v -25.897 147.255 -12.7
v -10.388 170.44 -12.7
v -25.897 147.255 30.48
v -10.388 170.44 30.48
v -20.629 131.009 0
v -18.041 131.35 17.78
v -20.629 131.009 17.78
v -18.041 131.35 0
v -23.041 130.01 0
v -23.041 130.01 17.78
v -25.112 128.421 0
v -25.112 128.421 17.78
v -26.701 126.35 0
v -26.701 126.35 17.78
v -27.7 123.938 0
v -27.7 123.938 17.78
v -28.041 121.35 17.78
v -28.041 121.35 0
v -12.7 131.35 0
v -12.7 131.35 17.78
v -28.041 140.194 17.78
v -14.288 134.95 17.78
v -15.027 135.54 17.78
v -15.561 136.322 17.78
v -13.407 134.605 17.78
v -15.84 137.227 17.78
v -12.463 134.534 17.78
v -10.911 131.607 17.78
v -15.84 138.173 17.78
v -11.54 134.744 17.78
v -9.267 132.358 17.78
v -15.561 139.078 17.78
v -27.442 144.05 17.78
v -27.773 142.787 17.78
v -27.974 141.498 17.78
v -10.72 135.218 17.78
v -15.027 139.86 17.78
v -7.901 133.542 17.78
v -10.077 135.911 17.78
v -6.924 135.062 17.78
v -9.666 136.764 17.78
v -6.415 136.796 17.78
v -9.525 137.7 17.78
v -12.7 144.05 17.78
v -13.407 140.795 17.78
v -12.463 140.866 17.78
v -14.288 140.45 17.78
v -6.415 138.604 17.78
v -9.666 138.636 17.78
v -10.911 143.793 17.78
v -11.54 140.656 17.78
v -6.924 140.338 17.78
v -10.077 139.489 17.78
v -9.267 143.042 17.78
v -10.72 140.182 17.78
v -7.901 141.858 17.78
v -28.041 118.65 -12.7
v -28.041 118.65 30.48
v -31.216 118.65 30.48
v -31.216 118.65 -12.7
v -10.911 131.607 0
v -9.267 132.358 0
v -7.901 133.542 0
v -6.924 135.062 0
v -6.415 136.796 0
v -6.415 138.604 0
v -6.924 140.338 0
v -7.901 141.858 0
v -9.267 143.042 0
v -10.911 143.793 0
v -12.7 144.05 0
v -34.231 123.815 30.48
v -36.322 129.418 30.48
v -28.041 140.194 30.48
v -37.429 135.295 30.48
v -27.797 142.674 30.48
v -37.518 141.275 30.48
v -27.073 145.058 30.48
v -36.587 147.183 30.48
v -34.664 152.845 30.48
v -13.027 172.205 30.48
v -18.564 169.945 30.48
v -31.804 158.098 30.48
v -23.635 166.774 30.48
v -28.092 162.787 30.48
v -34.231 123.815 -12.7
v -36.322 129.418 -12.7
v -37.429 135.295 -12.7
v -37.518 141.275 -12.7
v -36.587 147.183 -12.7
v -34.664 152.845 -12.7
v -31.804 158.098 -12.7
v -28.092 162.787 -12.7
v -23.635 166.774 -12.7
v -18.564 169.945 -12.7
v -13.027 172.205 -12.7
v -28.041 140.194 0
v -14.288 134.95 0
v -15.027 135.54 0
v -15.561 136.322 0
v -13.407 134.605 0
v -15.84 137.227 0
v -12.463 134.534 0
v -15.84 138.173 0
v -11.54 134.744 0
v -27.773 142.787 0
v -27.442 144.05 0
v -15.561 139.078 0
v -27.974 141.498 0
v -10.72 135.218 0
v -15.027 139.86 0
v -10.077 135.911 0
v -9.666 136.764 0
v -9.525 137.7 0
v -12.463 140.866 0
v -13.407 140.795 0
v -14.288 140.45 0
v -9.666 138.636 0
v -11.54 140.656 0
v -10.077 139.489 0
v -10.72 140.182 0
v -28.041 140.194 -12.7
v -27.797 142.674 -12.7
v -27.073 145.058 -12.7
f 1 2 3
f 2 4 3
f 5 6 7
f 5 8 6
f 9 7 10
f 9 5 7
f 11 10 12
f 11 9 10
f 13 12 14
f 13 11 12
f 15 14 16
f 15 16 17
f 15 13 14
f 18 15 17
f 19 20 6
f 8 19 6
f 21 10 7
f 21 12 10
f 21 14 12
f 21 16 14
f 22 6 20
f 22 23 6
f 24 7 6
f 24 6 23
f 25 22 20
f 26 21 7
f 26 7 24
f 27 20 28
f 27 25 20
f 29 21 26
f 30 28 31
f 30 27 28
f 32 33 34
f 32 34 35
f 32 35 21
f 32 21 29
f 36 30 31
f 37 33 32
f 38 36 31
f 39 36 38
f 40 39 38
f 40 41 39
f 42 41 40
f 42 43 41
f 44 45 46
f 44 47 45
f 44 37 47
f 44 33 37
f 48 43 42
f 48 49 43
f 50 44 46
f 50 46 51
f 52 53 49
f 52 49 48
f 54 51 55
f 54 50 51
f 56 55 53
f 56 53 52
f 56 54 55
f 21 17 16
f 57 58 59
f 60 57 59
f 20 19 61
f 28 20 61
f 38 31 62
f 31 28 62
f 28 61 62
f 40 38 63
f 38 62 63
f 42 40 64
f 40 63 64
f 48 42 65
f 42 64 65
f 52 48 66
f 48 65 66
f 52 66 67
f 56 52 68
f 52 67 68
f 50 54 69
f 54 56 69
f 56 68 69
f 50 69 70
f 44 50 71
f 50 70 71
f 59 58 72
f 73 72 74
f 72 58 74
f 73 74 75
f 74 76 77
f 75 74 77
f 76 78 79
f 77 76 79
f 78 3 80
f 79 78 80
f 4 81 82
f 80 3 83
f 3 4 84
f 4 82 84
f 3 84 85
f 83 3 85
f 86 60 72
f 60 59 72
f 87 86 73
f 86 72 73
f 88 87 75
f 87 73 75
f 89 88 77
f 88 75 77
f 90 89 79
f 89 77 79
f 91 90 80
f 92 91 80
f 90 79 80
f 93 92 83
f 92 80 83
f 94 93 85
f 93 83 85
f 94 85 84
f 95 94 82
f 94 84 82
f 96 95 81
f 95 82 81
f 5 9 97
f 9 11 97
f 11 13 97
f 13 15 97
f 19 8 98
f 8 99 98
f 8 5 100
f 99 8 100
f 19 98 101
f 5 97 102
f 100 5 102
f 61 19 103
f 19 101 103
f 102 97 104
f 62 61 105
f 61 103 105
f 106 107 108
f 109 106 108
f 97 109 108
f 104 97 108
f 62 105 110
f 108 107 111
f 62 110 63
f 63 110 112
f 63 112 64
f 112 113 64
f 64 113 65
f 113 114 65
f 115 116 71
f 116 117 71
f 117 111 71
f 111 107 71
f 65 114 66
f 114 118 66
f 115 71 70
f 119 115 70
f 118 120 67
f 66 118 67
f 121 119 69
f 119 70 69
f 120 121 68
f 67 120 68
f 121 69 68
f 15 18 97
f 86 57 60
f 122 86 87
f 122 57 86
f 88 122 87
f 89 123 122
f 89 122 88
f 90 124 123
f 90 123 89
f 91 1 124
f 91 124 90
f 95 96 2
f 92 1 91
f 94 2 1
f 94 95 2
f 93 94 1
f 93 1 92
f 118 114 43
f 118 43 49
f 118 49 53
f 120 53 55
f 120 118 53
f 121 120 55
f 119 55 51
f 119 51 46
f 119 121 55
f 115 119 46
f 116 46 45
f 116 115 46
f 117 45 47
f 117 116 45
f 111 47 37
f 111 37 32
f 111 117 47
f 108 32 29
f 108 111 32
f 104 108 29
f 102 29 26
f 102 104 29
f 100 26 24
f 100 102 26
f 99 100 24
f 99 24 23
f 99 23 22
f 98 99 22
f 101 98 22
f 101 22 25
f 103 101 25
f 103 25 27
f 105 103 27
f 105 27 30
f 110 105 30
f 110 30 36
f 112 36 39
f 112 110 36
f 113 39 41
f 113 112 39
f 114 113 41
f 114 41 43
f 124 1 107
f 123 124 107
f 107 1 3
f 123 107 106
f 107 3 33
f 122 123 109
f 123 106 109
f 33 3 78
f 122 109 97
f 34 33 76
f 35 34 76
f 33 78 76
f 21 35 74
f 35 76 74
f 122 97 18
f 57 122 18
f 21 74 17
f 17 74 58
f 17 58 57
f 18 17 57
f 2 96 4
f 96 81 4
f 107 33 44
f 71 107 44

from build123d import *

# Parameters (mm, degrees)
SKETCH1_R                = 6.35
SKETCH1_R_2              = 3.175
BOSS_EXTRUDE1_DEPTH      = 17.78
BOSS_EXTRUDE2_DEPTH      = 17.78
BOSS_EXTRUDE3_DEPTH      = 12.7
BOSS_EXTRUDE3_DEPTH_BACK = 30.48
FILLET1_R                = 10


with BuildPart() as part:
    # Sketch1 → Boss-Extrude1 (new body)
    with BuildSketch(Plane.XY):
        with Locations((-12.7, 137.7)):
            Circle(SKETCH1_R)
        with Locations((-12.7, 137.7)):
            Circle(SKETCH1_R_2, mode=Mode.SUBTRACT)
    extrude(amount=BOSS_EXTRUDE1_DEPTH)

    # Sketch2 → Boss-Extrude2 (add)
    with BuildSketch(Plane.XY.offset(17.78)):
        with BuildLine():
            Line((-12.7, 131.35), (-28.041116719, 131.35))
            Line((-28.041116719, 131.35), (-28.041116719, 144.05))
            Line((-28.041116719, 144.05), (-12.7, 144.05))
            ThreePointArc((-12.7, 144.05), (-19.05, 137.7), (-12.7, 131.35))
        make_face()
    extrude(amount=-BOSS_EXTRUDE2_DEPTH)

    # Sketch3 → Boss-Extrude3 (add, two sides)
    with BuildSketch(Plane.XY.offset(17.78)) as boss_extrude3_sk:
        with BuildLine():
            Line((-28.041116719, 131.35), (-28.041116719, 118.65))
            Line((-28.041116719, 118.65), (-31.216116719, 118.65))
            ThreePointArc((-31.216116719, 118.65), (-35.746712734, 150.055233925), (-13.026751575, 172.205140992))
            Line((-13.026751575, 172.205140992), (-10.387770933, 170.439806414))
            Line((-10.387770933, 170.439806414), (-25.897039285, 147.25515947))
            ThreePointArc((-25.897039285, 147.25515947), (-27.493281477, 143.883657427), (-28.041116719, 140.193821156))
            Line((-28.041116719, 140.193821156), (-28.041116719, 131.35))
        make_face()
    extrude(amount=BOSS_EXTRUDE3_DEPTH)
    extrude(boss_extrude3_sk.sketch, amount=-BOSS_EXTRUDE3_DEPTH_BACK)

    # Fillet1
    fillet1_edges = [part.edges().sort_by_distance(p)[0] for p in [
        (-28.041116719, 131.35, 8.89),
    ]]
    fillet(fillet1_edges, radius=FILLET1_R)


solid = part.part
